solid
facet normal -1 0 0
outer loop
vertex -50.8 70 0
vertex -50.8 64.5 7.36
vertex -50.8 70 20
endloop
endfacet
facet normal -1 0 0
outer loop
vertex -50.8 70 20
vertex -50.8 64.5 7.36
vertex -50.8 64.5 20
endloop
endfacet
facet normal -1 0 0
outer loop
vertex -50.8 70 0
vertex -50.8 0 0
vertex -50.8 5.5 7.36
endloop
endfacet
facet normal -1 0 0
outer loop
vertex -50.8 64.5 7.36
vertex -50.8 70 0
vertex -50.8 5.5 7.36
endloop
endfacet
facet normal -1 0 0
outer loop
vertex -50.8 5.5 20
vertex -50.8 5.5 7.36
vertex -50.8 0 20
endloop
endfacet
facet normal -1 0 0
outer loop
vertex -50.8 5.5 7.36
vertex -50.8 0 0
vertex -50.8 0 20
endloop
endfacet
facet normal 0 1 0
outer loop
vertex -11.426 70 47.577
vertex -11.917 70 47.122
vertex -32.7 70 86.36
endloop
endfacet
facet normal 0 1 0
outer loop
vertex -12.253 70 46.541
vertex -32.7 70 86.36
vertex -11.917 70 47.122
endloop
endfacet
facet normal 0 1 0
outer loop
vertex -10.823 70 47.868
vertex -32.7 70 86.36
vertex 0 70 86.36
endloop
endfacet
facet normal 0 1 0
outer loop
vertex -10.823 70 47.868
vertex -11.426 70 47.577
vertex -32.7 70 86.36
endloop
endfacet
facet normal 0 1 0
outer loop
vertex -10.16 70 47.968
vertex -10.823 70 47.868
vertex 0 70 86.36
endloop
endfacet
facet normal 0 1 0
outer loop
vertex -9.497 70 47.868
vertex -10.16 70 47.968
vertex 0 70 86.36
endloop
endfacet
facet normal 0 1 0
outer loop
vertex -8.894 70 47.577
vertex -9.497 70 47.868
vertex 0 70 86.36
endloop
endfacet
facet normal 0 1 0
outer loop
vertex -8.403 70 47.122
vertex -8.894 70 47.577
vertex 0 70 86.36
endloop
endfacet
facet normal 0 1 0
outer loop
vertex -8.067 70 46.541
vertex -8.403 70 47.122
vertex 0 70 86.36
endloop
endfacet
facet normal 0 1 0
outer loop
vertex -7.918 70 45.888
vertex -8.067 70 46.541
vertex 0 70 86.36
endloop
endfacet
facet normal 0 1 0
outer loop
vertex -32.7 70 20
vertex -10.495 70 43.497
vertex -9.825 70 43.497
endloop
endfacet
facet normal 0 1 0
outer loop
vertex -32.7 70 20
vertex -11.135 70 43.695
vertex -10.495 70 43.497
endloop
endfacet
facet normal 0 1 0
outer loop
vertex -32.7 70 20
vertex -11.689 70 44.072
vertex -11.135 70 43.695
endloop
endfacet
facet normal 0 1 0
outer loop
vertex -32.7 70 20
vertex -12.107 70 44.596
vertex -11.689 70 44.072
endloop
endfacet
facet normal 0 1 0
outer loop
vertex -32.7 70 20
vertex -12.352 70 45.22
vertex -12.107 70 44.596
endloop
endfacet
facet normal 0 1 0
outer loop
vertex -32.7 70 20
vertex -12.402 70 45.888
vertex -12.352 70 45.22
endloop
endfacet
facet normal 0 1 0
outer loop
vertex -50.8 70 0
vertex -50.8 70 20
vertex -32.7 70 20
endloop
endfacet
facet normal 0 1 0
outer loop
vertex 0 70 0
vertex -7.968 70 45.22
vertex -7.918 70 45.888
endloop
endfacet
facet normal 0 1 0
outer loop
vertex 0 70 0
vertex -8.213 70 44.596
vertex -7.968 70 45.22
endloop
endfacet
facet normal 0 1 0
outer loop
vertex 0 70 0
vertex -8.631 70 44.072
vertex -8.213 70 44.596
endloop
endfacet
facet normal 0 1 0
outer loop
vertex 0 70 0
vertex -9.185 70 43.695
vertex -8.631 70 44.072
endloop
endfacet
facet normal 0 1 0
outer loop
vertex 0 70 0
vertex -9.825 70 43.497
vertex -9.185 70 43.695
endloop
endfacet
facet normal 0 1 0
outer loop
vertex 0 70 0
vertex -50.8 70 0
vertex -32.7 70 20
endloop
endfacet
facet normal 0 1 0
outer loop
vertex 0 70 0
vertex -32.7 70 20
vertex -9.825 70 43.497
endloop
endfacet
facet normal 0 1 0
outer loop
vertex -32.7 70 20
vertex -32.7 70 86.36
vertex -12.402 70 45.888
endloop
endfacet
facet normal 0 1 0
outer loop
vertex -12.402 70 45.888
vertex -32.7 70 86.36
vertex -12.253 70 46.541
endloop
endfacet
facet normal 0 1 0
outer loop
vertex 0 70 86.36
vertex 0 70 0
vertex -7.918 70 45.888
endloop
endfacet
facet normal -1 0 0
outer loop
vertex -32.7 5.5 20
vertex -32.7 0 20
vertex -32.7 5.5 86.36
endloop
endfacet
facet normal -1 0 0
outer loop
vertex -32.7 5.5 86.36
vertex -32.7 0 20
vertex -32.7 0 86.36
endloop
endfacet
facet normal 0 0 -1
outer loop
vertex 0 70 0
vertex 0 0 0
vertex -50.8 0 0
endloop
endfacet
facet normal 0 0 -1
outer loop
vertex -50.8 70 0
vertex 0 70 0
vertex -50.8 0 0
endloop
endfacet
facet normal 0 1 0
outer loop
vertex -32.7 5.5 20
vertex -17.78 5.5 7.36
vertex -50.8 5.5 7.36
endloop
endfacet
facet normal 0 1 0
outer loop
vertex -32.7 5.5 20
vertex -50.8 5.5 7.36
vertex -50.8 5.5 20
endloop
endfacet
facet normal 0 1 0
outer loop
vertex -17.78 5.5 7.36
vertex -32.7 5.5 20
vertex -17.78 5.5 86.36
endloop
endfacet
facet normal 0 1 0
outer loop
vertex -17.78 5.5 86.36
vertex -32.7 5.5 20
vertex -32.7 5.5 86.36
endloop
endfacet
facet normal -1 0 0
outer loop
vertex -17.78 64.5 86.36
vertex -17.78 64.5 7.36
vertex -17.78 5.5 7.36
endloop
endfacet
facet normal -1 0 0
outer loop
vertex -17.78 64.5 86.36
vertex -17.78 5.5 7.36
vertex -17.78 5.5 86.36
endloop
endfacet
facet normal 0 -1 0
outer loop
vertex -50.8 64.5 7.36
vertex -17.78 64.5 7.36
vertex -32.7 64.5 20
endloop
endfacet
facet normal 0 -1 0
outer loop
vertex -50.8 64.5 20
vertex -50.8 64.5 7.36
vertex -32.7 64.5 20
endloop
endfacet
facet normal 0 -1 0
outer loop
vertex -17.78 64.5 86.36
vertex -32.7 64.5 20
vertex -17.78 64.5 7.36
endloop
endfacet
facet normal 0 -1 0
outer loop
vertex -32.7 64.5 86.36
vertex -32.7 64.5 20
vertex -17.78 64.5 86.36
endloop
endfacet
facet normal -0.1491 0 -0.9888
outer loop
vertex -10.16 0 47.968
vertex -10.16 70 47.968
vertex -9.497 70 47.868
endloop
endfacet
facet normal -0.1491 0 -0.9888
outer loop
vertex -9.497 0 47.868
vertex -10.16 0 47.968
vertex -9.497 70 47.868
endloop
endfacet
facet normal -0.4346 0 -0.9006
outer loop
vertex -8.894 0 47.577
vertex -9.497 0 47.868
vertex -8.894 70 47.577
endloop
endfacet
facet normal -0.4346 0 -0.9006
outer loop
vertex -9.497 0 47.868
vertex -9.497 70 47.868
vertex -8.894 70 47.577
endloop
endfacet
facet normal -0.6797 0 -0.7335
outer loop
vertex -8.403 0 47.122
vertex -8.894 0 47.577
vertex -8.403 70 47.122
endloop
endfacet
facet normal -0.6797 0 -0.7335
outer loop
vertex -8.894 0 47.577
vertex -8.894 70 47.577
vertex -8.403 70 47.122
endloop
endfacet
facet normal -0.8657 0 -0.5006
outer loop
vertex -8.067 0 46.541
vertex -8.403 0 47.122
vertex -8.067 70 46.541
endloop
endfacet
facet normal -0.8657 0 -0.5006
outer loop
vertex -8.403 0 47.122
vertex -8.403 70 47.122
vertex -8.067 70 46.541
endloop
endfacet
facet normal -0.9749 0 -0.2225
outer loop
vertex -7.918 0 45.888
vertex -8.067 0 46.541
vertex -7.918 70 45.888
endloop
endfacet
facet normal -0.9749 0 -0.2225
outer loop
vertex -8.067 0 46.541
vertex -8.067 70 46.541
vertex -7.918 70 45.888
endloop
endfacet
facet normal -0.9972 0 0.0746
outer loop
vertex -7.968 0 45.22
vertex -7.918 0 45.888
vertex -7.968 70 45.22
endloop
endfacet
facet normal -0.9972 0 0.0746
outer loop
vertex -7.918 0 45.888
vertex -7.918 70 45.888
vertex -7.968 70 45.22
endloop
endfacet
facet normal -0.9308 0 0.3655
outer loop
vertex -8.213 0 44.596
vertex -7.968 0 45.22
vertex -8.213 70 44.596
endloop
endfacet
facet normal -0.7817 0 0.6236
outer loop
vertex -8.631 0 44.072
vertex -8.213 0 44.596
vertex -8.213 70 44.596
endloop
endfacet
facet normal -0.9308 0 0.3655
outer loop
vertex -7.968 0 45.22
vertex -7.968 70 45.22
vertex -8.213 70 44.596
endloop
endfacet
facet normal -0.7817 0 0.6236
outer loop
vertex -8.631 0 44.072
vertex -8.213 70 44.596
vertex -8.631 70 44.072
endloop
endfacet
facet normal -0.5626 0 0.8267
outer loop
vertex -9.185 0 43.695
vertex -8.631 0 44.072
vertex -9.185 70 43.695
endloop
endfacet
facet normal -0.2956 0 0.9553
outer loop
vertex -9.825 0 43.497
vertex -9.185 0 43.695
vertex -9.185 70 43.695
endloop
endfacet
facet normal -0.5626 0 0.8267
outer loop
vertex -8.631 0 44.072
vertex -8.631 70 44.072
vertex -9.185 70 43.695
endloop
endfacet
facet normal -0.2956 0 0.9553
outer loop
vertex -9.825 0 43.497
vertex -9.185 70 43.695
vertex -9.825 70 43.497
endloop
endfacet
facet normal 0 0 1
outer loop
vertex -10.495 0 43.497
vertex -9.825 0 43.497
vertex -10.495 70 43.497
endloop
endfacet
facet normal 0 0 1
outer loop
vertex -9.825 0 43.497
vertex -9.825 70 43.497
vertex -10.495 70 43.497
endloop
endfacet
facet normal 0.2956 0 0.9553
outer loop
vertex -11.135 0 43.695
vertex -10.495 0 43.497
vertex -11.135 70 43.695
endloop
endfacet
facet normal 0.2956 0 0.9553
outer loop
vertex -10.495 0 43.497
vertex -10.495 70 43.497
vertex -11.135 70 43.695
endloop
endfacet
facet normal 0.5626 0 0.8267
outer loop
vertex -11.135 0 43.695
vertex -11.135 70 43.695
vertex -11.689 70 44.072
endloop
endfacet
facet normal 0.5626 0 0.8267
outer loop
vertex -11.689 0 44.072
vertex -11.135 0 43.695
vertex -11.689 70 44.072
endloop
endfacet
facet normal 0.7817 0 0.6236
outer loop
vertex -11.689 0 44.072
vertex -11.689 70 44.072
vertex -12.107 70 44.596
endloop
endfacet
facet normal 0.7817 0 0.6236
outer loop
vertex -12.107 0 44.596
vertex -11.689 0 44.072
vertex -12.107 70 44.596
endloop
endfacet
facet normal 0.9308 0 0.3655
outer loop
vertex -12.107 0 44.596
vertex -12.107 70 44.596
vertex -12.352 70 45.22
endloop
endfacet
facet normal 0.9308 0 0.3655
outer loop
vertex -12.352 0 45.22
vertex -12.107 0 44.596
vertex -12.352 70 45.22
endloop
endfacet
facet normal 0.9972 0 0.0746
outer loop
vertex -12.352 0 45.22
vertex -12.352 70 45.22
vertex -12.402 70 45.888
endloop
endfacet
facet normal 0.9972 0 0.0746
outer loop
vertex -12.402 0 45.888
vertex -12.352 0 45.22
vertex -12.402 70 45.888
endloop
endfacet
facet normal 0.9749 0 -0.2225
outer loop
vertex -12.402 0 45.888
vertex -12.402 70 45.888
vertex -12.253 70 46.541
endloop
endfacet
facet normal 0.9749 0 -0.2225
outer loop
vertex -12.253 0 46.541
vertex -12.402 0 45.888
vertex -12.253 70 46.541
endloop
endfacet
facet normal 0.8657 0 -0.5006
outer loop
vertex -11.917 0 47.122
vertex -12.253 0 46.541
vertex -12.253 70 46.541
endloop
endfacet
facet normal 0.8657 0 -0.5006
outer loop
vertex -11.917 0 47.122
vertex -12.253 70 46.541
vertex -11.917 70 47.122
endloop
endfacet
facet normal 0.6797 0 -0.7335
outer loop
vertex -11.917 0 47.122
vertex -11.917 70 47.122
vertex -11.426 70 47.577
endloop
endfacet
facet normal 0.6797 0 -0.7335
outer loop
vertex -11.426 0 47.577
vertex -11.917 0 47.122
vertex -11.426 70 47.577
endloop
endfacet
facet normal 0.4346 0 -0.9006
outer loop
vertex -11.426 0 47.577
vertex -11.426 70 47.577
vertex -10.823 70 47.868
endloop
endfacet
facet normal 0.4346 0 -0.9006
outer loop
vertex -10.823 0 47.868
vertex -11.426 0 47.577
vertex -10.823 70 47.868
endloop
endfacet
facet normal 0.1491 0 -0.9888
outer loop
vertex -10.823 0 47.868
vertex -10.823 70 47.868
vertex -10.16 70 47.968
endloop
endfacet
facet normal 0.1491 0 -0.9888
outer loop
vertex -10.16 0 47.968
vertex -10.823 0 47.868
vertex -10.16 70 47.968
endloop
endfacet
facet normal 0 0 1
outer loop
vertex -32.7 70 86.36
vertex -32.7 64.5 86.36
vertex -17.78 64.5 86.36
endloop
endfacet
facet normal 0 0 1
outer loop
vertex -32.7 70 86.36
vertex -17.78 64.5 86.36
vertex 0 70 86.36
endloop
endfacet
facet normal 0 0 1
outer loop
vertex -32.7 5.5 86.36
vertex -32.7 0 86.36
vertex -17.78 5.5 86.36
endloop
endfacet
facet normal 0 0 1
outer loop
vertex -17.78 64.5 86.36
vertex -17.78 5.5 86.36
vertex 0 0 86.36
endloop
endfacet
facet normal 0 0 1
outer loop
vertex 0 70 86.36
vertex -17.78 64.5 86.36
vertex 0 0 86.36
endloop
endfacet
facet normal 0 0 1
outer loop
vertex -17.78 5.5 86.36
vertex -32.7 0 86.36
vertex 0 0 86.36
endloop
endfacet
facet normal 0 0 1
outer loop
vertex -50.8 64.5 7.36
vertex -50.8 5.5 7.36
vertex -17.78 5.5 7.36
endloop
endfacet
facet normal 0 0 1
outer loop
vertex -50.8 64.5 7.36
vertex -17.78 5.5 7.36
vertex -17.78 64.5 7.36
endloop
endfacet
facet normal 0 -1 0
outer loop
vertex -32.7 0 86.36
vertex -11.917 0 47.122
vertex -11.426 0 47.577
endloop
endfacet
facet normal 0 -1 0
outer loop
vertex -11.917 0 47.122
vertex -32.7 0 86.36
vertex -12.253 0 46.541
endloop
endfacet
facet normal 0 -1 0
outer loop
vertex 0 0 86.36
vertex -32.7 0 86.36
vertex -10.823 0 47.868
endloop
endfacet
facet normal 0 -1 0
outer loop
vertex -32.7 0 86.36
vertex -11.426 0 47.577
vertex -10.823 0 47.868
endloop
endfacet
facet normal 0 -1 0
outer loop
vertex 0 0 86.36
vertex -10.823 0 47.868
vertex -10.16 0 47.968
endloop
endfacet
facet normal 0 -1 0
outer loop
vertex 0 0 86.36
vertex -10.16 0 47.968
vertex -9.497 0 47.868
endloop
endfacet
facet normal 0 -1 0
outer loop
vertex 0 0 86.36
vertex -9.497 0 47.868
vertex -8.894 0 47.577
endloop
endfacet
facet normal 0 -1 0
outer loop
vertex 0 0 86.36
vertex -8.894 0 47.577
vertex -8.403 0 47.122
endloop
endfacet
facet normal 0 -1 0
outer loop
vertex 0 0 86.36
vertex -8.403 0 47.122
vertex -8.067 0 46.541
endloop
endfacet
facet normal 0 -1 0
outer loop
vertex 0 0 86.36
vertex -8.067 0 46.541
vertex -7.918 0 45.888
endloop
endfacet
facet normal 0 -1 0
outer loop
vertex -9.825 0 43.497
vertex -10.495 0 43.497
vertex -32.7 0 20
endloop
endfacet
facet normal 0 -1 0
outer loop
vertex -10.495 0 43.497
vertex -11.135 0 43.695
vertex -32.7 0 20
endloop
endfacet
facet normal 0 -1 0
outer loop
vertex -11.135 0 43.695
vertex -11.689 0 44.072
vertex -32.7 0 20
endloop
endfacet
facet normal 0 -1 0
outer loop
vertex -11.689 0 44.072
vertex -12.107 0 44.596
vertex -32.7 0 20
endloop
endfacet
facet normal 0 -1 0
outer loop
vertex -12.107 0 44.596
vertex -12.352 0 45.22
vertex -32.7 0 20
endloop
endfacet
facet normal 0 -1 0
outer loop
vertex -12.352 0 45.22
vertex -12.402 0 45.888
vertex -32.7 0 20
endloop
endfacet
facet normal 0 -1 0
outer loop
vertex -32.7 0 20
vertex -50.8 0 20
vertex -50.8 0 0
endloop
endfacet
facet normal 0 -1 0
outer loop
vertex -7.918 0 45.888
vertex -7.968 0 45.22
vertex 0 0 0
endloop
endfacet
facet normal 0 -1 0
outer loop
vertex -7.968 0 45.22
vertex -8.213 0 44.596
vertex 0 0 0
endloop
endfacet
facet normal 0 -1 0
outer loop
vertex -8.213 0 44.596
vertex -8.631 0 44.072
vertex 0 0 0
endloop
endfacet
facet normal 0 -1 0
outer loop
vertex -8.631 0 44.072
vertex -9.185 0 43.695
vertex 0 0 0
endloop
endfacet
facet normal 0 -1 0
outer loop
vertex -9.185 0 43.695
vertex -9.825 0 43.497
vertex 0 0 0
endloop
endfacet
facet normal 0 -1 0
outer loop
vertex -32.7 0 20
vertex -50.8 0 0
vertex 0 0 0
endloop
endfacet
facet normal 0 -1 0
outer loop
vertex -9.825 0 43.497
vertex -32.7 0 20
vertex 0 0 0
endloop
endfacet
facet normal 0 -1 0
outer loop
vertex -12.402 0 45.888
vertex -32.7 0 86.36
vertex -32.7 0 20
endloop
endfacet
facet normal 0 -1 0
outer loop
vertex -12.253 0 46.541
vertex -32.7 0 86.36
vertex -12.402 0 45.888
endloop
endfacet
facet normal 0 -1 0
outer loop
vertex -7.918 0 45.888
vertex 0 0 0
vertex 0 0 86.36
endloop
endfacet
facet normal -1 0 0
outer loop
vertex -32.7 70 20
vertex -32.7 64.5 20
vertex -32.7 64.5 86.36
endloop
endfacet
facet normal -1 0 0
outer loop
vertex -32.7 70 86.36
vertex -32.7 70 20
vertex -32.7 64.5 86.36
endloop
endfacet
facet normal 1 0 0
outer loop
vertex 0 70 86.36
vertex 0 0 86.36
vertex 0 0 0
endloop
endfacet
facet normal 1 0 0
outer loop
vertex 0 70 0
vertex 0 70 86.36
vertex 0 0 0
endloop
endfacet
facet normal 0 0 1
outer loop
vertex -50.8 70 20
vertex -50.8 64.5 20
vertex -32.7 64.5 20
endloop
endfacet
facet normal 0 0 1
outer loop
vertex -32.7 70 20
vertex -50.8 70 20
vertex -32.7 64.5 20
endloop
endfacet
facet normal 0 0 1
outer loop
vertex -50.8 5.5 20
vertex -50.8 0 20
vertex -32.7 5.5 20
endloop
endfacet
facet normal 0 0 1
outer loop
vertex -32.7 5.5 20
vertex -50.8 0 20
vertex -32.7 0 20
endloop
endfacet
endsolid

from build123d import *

# Parameters (mm, degrees)
BOSS_EXTRUDE1_DEPTH = 70
SKETCH2_W           = 79
SKETCH2_H           = 59
CUT_EXTRUDE1_DEPTH  = 33.02
SKETCH3_R           = 2.2479
CUT_EXTRUDE2_DEPTH  = 123.22393219


with BuildPart() as part:
    # Sketch1 → Boss-Extrude1 (new body)
    with BuildSketch(Plane(origin=(0, 0, 0), x_dir=(1, 0, 0), z_dir=(0, 1, 0))):
        Polygon((-50.8, -20), (-32.7, -20), (-32.7, -86.36), (0, -86.36), (0, 0), (-50.8, 0), align=None)
    extrude(amount=BOSS_EXTRUDE1_DEPTH)

    # Sketch2 → Cut-Extrude1 (cut)
    with BuildSketch(Plane.ZY.offset(50.8)):
        with Locations((46.86, 35)):
            Rectangle(SKETCH2_W, SKETCH2_H)
    extrude(amount=-CUT_EXTRUDE1_DEPTH, mode=Mode.SUBTRACT)

    # Sketch3 → Cut-Extrude2 (cut, through all)
    with BuildSketch(Plane(origin=(0, 70, 0), x_dir=(1, 0, 0), z_dir=(0, 1, 0))):
        with Locations(Location((-10.16, -45.72, 0), (0, 0, 270))):
            Circle(SKETCH3_R)
    extrude(amount=-CUT_EXTRUDE2_DEPTH, mode=Mode.SUBTRACT)


solid = part.part
